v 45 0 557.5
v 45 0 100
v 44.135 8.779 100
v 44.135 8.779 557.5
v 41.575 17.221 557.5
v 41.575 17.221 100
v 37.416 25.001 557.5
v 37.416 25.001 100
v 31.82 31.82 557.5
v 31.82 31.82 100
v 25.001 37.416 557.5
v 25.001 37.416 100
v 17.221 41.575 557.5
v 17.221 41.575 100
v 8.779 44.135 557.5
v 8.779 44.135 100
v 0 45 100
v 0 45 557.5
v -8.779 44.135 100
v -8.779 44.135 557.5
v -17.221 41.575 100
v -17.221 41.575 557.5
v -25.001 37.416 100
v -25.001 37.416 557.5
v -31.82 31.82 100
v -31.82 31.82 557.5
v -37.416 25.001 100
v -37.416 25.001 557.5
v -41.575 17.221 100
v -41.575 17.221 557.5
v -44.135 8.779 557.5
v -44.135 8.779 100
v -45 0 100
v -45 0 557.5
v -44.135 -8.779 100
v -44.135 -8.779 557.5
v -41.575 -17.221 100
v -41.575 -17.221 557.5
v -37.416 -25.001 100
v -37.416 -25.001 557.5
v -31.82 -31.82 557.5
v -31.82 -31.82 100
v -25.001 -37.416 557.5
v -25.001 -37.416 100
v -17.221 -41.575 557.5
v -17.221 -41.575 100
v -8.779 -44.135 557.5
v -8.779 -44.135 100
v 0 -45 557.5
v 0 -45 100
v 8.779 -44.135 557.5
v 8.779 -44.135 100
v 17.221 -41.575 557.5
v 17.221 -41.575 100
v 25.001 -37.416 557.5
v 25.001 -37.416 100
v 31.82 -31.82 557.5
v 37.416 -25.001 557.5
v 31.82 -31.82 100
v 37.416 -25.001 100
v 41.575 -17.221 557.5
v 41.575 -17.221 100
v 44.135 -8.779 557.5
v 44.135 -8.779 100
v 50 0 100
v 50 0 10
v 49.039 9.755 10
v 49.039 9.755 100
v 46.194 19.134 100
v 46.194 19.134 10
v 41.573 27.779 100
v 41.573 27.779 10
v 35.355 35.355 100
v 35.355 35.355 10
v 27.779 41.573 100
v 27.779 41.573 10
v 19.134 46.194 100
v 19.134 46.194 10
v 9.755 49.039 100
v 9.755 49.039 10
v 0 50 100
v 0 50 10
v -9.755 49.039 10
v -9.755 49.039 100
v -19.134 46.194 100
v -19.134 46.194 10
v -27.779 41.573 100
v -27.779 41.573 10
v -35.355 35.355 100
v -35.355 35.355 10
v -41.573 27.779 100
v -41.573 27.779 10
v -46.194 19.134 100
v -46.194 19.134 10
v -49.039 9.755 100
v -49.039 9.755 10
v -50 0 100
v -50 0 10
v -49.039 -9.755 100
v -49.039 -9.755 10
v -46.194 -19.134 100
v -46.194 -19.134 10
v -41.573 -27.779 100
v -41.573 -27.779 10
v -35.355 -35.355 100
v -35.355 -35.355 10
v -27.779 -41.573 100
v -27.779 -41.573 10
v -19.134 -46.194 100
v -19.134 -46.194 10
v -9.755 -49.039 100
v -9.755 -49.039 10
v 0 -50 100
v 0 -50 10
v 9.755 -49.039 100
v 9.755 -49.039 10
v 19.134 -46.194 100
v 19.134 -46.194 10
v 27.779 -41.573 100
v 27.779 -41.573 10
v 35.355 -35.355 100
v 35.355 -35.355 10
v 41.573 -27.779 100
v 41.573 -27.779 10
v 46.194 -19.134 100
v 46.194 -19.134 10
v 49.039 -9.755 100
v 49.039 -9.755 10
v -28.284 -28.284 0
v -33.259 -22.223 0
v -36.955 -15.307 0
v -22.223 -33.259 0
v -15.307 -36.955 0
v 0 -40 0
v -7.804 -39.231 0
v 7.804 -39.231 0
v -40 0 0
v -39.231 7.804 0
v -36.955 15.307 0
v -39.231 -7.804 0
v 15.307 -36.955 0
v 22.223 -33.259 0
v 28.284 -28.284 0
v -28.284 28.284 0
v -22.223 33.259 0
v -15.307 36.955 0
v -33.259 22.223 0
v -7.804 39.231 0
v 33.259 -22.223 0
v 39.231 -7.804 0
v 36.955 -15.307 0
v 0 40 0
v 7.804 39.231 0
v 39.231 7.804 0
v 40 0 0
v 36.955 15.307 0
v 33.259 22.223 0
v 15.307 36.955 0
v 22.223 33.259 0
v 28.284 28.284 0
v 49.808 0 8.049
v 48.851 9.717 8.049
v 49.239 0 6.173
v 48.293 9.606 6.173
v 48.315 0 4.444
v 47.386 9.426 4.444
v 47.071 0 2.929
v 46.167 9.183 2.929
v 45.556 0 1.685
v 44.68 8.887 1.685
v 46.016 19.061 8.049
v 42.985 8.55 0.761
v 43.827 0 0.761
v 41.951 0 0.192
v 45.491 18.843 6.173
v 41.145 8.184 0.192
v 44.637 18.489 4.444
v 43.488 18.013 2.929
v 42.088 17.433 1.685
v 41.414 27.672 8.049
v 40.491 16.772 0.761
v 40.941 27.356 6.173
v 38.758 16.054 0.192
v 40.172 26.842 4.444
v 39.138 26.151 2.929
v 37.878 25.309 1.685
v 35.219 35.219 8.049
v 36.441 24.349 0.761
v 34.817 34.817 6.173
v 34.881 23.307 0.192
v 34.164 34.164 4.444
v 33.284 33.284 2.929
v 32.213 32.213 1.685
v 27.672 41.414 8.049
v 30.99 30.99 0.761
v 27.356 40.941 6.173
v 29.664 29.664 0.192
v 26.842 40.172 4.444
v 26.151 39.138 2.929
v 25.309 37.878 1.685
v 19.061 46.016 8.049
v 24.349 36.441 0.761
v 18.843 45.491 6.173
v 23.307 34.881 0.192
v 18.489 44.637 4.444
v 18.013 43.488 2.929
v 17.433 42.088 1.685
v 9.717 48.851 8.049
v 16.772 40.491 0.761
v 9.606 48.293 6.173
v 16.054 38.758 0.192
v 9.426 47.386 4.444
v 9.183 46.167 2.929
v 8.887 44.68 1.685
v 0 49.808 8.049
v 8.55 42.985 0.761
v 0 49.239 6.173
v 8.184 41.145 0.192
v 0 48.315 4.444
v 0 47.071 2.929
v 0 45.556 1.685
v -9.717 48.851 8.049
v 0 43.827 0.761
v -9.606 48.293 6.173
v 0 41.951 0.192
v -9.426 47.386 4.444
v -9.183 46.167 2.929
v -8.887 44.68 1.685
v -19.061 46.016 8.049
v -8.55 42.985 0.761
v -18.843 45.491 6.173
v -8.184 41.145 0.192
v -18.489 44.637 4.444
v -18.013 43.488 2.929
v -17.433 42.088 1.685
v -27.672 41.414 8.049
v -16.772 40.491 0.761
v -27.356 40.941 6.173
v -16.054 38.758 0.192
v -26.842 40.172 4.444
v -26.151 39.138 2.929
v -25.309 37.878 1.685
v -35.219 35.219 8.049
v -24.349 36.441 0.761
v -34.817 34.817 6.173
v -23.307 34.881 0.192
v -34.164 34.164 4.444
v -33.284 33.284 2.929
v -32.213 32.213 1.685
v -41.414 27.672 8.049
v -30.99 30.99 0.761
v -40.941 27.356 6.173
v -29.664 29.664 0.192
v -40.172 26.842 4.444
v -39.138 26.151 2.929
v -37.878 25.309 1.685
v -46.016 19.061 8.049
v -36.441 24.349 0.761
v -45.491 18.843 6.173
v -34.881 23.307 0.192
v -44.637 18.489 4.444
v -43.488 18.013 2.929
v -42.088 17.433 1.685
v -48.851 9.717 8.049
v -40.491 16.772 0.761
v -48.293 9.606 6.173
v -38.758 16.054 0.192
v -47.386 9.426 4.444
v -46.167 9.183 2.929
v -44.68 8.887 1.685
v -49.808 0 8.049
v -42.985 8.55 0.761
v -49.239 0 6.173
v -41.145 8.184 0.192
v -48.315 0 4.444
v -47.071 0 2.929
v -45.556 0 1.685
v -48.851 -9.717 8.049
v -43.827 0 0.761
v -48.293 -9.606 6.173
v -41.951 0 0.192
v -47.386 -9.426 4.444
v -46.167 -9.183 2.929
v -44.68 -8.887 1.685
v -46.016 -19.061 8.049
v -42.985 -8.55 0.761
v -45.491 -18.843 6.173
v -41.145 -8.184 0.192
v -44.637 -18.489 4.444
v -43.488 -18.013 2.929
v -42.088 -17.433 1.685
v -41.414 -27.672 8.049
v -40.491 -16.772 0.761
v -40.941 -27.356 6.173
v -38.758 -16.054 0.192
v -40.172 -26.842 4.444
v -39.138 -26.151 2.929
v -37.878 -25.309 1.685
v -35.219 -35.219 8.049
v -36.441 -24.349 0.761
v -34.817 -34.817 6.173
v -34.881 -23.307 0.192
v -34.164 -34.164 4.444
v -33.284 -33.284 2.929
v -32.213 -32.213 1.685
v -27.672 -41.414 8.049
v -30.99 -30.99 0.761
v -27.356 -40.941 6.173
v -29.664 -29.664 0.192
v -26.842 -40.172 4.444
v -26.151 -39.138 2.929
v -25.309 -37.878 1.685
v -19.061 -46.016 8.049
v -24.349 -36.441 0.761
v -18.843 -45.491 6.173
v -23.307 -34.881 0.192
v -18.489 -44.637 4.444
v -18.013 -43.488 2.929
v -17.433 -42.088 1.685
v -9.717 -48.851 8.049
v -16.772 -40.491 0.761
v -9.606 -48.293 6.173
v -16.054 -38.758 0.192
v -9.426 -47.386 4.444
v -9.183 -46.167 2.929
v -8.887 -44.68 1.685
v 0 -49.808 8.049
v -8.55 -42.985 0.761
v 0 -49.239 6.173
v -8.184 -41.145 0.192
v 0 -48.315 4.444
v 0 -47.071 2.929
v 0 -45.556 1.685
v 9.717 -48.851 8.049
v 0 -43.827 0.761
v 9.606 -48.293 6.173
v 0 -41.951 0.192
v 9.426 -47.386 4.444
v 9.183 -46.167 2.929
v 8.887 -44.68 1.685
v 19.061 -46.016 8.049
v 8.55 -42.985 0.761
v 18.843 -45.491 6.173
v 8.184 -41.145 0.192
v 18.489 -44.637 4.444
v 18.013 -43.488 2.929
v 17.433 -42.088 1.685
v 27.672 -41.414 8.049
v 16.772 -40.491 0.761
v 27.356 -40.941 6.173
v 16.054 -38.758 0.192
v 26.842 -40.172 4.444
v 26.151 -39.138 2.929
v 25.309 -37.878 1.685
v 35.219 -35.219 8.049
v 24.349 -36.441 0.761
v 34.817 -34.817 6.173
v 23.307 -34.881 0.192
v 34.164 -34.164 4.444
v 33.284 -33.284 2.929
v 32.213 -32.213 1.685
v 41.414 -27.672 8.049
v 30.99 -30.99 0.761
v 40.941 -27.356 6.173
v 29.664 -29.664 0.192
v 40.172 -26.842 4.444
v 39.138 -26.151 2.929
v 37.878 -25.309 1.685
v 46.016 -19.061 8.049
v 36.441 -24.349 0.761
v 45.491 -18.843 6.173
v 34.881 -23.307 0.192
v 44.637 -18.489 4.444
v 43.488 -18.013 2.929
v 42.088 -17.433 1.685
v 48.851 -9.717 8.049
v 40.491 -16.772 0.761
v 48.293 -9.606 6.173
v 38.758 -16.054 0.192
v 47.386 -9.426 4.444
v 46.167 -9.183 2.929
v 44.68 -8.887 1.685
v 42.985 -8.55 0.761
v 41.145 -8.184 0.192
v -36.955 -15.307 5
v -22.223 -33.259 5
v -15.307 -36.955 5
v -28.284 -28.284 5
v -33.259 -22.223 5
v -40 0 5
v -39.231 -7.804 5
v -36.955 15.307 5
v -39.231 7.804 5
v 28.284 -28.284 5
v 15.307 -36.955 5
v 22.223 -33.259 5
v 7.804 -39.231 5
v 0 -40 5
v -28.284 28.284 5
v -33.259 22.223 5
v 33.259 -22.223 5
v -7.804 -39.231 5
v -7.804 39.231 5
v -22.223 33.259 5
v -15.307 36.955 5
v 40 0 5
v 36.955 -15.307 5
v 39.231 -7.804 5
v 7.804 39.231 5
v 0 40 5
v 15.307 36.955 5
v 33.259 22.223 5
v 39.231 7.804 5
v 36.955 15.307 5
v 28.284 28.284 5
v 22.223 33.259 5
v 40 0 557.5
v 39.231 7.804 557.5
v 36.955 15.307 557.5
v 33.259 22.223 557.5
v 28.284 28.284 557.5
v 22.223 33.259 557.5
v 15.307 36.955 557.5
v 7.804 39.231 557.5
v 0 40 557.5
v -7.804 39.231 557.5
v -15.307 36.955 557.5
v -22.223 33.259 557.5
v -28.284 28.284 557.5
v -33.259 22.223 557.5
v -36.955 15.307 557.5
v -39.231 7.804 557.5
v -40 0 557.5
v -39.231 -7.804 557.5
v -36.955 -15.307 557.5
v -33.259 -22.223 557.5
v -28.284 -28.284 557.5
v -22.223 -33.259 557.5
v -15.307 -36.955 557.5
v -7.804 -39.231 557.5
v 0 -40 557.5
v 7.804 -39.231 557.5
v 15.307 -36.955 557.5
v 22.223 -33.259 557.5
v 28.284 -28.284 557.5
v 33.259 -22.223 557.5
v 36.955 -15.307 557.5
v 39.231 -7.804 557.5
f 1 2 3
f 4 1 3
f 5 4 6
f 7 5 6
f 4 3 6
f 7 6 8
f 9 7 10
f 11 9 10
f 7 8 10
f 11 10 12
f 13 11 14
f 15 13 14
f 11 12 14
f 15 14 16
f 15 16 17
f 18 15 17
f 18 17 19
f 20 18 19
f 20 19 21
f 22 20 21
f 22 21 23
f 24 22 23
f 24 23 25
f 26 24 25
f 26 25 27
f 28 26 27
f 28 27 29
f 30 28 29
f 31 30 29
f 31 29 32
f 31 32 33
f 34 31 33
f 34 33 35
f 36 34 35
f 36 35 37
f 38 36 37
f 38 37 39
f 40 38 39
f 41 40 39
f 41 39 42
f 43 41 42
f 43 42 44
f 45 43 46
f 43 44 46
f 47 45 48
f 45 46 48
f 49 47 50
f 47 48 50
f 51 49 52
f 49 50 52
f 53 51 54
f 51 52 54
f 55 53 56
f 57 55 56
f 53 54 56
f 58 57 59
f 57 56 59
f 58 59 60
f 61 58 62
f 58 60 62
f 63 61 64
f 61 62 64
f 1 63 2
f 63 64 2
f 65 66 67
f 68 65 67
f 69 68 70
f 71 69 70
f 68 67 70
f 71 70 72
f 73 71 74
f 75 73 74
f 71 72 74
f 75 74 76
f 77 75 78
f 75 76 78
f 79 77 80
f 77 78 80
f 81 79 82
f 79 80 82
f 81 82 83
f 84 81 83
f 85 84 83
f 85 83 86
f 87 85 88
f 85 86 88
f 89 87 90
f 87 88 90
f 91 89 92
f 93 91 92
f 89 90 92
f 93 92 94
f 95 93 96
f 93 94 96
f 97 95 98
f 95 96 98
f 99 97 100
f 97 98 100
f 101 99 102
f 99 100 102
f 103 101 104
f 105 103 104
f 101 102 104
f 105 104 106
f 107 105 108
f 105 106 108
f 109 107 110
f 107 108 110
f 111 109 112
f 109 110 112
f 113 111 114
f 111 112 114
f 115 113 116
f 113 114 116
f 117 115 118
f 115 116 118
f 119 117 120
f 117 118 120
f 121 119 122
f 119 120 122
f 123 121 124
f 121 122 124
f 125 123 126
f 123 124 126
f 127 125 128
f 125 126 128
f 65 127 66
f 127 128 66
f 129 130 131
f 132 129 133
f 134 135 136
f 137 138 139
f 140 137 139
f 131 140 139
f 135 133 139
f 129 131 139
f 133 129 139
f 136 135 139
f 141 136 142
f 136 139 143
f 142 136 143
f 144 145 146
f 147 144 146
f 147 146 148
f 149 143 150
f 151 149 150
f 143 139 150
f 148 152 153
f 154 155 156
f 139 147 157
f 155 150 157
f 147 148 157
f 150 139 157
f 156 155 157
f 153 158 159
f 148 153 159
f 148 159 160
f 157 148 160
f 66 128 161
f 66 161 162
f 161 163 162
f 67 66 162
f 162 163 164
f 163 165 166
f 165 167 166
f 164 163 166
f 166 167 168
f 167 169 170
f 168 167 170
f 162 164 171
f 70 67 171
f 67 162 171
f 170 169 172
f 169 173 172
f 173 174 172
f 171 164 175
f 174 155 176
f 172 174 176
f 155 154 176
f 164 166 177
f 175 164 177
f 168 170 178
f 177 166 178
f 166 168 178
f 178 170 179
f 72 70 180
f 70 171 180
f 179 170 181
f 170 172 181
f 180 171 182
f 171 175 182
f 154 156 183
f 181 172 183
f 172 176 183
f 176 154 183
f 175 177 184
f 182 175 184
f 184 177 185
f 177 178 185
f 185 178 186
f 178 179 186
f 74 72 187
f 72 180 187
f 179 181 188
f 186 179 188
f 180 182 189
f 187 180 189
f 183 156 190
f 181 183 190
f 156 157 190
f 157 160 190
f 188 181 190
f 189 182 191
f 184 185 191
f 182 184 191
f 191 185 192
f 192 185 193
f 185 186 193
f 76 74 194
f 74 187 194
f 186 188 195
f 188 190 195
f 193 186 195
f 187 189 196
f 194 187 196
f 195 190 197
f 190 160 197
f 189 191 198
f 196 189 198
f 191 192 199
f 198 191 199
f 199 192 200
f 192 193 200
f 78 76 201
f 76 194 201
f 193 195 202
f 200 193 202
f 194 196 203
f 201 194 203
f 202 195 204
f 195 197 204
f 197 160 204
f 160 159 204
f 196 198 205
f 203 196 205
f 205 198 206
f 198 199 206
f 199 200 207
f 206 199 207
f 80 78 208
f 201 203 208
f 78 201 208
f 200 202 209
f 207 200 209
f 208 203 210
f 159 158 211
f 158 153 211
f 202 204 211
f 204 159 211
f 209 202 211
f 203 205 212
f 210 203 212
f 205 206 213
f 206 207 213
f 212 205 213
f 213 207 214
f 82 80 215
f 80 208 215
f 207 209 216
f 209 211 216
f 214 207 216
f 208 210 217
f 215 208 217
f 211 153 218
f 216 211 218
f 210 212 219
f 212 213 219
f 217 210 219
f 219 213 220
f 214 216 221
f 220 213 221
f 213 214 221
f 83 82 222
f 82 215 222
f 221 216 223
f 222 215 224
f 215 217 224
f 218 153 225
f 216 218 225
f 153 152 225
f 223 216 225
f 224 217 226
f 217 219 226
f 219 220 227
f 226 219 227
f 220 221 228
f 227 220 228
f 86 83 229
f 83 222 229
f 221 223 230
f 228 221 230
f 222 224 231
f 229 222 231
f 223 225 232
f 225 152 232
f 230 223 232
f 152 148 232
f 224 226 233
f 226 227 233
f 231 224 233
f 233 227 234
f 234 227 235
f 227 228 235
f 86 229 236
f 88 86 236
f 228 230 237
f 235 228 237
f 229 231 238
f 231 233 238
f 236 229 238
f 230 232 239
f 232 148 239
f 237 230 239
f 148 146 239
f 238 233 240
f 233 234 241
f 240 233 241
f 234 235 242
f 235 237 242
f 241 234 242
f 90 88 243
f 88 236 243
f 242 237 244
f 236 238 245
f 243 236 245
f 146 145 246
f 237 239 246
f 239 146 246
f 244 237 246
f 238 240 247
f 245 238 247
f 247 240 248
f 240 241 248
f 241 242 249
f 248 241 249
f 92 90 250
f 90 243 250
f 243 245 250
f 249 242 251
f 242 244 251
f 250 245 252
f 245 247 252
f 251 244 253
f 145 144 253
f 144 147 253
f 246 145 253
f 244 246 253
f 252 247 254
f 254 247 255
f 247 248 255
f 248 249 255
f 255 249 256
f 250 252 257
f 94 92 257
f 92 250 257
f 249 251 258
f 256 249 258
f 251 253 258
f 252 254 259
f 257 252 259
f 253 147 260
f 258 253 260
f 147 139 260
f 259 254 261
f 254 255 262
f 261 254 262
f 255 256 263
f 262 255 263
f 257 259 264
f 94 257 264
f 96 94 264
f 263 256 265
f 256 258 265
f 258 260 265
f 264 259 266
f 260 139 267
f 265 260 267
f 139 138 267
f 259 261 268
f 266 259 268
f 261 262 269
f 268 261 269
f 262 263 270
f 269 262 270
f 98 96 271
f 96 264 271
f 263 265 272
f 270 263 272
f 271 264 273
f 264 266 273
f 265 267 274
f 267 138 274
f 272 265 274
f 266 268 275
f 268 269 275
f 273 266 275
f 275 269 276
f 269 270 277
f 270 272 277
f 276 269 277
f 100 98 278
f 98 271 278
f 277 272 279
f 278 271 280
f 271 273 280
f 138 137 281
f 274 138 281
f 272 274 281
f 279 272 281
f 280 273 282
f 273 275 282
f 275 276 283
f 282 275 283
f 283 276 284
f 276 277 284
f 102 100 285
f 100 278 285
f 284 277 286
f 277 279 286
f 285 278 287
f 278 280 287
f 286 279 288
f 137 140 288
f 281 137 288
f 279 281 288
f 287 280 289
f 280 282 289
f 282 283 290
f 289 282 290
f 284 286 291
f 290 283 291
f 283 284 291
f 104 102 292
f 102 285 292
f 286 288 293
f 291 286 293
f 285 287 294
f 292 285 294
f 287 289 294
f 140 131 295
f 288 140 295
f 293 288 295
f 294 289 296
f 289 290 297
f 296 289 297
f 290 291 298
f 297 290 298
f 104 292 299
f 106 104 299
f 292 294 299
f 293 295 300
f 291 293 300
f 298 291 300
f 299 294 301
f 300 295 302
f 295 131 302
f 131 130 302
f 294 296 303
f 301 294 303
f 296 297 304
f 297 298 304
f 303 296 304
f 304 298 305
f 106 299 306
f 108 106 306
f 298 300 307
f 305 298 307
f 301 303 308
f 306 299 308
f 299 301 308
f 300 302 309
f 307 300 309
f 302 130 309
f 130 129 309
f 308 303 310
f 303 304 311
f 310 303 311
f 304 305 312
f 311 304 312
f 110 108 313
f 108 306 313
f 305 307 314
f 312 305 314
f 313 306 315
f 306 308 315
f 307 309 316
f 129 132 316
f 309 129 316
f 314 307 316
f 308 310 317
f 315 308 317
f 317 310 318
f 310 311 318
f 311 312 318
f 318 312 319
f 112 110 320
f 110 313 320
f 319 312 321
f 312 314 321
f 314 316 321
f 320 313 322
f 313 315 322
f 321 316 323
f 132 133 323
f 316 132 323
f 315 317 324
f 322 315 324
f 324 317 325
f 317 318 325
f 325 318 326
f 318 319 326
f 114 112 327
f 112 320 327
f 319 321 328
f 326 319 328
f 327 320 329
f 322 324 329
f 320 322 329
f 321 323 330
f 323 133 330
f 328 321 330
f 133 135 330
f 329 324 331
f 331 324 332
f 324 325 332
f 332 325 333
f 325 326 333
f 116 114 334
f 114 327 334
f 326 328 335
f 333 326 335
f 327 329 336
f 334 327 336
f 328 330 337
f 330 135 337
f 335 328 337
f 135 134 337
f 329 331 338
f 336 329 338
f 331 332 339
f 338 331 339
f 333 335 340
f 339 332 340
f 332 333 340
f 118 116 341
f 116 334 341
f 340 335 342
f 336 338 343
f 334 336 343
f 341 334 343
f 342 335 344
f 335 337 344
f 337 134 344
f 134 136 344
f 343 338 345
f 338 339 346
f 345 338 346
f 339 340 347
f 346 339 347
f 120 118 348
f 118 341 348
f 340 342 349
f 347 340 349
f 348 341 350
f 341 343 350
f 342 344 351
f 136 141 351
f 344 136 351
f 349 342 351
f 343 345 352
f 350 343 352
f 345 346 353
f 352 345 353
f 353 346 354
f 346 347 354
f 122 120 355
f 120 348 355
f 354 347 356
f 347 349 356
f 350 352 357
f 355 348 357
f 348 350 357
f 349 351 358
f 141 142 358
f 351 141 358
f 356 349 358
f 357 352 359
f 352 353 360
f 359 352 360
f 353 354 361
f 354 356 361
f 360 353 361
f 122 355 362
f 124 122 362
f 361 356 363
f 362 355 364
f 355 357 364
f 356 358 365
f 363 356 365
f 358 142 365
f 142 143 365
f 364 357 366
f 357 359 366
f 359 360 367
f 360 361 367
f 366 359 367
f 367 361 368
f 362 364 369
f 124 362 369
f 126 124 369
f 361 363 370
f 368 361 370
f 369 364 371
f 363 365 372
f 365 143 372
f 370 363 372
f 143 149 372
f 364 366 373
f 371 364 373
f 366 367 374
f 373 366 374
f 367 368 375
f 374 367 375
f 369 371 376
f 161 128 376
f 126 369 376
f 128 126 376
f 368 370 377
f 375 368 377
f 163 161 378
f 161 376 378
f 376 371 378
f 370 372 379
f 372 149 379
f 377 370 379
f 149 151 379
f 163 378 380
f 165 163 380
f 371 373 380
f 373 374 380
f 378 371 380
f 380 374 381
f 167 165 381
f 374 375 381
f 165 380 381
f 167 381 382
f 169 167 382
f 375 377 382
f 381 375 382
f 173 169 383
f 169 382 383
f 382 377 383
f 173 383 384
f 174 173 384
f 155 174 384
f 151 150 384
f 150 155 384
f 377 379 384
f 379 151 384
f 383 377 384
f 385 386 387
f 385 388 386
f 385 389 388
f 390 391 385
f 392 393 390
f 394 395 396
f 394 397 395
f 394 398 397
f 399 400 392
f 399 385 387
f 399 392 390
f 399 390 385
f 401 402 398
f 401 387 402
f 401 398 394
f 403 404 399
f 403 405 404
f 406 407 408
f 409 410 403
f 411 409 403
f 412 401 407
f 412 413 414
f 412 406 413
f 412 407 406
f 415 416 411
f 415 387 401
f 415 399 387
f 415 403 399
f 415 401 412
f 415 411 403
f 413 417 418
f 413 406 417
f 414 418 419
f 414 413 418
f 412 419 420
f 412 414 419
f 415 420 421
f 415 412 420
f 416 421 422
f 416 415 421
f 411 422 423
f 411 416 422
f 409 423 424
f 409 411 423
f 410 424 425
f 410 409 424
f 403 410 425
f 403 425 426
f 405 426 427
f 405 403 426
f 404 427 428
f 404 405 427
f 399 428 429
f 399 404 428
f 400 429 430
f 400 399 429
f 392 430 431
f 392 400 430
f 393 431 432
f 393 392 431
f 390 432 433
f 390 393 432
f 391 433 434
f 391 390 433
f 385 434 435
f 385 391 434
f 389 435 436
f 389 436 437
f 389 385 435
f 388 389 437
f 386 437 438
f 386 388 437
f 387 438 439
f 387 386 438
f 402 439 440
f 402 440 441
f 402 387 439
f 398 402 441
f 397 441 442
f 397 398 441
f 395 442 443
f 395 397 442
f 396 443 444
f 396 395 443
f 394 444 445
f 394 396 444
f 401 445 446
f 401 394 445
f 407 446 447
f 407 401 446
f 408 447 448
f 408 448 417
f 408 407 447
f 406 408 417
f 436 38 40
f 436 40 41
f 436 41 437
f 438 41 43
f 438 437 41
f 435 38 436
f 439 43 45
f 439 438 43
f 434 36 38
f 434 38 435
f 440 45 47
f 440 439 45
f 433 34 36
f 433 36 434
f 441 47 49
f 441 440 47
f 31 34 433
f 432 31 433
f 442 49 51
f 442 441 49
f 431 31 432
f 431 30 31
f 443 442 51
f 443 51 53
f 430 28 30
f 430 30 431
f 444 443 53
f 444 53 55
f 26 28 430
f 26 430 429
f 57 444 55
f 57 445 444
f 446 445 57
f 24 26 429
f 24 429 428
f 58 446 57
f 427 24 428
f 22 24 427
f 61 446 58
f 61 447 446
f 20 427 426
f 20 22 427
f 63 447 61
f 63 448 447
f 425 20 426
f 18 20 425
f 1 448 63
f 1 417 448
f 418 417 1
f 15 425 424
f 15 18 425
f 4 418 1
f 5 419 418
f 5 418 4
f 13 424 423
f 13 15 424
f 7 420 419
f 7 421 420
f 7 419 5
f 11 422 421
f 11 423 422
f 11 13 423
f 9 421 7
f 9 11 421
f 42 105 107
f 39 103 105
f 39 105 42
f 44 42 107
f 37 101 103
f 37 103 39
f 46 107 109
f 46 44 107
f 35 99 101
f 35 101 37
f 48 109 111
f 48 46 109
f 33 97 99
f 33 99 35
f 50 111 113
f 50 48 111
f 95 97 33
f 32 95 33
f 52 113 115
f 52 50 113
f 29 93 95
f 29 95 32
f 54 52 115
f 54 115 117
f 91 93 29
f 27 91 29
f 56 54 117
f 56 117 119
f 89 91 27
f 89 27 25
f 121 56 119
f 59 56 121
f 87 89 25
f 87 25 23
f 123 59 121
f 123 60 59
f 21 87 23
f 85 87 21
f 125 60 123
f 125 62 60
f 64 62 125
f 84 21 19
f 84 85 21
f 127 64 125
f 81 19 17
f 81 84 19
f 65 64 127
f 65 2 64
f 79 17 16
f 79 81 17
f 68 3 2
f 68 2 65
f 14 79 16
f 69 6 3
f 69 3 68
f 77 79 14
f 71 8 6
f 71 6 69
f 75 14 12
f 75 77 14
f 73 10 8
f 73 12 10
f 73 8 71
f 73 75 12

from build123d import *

# Parameters (mm, degrees)
F0_R     = 45
F0_R_2   = 40
F1_DEPTH = 50
F0_R_3   = 50
F2_DEPTH = 100
F3_DEPTH = 5
F4_R     = 10
F5_DEPTH = 507.5


with BuildPart() as f1:
    # F0 (on Top) → F1 (new body)
    with BuildSketch(Plane.XY):
        Circle(F0_R)
        Circle(F0_R_2, mode=Mode.SUBTRACT)
    extrude(amount=F1_DEPTH)

    # F0 (on Top) → F2 (join)
    with BuildSketch(Plane.XY):
        Circle(F0_R_3)
        Circle(F0_R, mode=Mode.SUBTRACT)
    extrude(amount=F2_DEPTH)

    # F0 (on Top) → F3 (join)
    with BuildSketch(Plane.XY):
        Circle(F0_R_3)
        Circle(F0_R, mode=Mode.SUBTRACT)
        Circle(F0_R)
        Circle(F0_R_2, mode=Mode.SUBTRACT)
        Circle(F0_R_2)
    extrude(amount=F3_DEPTH)

    # F4
    f4_edges = [f1.edges().sort_by_distance(p)[0] for p in [
        (-50, 0, 0),
    ]]
    fillet(f4_edges, radius=F4_R)

    # F5 (add): a face of the model
    f5_faces = [f1.faces().sort_by_distance(p)[0] for p in [
        (-43.7272077939, 0, 50),
    ]]
    extrude(f5_faces, amount=F5_DEPTH)


solid = f1.part
